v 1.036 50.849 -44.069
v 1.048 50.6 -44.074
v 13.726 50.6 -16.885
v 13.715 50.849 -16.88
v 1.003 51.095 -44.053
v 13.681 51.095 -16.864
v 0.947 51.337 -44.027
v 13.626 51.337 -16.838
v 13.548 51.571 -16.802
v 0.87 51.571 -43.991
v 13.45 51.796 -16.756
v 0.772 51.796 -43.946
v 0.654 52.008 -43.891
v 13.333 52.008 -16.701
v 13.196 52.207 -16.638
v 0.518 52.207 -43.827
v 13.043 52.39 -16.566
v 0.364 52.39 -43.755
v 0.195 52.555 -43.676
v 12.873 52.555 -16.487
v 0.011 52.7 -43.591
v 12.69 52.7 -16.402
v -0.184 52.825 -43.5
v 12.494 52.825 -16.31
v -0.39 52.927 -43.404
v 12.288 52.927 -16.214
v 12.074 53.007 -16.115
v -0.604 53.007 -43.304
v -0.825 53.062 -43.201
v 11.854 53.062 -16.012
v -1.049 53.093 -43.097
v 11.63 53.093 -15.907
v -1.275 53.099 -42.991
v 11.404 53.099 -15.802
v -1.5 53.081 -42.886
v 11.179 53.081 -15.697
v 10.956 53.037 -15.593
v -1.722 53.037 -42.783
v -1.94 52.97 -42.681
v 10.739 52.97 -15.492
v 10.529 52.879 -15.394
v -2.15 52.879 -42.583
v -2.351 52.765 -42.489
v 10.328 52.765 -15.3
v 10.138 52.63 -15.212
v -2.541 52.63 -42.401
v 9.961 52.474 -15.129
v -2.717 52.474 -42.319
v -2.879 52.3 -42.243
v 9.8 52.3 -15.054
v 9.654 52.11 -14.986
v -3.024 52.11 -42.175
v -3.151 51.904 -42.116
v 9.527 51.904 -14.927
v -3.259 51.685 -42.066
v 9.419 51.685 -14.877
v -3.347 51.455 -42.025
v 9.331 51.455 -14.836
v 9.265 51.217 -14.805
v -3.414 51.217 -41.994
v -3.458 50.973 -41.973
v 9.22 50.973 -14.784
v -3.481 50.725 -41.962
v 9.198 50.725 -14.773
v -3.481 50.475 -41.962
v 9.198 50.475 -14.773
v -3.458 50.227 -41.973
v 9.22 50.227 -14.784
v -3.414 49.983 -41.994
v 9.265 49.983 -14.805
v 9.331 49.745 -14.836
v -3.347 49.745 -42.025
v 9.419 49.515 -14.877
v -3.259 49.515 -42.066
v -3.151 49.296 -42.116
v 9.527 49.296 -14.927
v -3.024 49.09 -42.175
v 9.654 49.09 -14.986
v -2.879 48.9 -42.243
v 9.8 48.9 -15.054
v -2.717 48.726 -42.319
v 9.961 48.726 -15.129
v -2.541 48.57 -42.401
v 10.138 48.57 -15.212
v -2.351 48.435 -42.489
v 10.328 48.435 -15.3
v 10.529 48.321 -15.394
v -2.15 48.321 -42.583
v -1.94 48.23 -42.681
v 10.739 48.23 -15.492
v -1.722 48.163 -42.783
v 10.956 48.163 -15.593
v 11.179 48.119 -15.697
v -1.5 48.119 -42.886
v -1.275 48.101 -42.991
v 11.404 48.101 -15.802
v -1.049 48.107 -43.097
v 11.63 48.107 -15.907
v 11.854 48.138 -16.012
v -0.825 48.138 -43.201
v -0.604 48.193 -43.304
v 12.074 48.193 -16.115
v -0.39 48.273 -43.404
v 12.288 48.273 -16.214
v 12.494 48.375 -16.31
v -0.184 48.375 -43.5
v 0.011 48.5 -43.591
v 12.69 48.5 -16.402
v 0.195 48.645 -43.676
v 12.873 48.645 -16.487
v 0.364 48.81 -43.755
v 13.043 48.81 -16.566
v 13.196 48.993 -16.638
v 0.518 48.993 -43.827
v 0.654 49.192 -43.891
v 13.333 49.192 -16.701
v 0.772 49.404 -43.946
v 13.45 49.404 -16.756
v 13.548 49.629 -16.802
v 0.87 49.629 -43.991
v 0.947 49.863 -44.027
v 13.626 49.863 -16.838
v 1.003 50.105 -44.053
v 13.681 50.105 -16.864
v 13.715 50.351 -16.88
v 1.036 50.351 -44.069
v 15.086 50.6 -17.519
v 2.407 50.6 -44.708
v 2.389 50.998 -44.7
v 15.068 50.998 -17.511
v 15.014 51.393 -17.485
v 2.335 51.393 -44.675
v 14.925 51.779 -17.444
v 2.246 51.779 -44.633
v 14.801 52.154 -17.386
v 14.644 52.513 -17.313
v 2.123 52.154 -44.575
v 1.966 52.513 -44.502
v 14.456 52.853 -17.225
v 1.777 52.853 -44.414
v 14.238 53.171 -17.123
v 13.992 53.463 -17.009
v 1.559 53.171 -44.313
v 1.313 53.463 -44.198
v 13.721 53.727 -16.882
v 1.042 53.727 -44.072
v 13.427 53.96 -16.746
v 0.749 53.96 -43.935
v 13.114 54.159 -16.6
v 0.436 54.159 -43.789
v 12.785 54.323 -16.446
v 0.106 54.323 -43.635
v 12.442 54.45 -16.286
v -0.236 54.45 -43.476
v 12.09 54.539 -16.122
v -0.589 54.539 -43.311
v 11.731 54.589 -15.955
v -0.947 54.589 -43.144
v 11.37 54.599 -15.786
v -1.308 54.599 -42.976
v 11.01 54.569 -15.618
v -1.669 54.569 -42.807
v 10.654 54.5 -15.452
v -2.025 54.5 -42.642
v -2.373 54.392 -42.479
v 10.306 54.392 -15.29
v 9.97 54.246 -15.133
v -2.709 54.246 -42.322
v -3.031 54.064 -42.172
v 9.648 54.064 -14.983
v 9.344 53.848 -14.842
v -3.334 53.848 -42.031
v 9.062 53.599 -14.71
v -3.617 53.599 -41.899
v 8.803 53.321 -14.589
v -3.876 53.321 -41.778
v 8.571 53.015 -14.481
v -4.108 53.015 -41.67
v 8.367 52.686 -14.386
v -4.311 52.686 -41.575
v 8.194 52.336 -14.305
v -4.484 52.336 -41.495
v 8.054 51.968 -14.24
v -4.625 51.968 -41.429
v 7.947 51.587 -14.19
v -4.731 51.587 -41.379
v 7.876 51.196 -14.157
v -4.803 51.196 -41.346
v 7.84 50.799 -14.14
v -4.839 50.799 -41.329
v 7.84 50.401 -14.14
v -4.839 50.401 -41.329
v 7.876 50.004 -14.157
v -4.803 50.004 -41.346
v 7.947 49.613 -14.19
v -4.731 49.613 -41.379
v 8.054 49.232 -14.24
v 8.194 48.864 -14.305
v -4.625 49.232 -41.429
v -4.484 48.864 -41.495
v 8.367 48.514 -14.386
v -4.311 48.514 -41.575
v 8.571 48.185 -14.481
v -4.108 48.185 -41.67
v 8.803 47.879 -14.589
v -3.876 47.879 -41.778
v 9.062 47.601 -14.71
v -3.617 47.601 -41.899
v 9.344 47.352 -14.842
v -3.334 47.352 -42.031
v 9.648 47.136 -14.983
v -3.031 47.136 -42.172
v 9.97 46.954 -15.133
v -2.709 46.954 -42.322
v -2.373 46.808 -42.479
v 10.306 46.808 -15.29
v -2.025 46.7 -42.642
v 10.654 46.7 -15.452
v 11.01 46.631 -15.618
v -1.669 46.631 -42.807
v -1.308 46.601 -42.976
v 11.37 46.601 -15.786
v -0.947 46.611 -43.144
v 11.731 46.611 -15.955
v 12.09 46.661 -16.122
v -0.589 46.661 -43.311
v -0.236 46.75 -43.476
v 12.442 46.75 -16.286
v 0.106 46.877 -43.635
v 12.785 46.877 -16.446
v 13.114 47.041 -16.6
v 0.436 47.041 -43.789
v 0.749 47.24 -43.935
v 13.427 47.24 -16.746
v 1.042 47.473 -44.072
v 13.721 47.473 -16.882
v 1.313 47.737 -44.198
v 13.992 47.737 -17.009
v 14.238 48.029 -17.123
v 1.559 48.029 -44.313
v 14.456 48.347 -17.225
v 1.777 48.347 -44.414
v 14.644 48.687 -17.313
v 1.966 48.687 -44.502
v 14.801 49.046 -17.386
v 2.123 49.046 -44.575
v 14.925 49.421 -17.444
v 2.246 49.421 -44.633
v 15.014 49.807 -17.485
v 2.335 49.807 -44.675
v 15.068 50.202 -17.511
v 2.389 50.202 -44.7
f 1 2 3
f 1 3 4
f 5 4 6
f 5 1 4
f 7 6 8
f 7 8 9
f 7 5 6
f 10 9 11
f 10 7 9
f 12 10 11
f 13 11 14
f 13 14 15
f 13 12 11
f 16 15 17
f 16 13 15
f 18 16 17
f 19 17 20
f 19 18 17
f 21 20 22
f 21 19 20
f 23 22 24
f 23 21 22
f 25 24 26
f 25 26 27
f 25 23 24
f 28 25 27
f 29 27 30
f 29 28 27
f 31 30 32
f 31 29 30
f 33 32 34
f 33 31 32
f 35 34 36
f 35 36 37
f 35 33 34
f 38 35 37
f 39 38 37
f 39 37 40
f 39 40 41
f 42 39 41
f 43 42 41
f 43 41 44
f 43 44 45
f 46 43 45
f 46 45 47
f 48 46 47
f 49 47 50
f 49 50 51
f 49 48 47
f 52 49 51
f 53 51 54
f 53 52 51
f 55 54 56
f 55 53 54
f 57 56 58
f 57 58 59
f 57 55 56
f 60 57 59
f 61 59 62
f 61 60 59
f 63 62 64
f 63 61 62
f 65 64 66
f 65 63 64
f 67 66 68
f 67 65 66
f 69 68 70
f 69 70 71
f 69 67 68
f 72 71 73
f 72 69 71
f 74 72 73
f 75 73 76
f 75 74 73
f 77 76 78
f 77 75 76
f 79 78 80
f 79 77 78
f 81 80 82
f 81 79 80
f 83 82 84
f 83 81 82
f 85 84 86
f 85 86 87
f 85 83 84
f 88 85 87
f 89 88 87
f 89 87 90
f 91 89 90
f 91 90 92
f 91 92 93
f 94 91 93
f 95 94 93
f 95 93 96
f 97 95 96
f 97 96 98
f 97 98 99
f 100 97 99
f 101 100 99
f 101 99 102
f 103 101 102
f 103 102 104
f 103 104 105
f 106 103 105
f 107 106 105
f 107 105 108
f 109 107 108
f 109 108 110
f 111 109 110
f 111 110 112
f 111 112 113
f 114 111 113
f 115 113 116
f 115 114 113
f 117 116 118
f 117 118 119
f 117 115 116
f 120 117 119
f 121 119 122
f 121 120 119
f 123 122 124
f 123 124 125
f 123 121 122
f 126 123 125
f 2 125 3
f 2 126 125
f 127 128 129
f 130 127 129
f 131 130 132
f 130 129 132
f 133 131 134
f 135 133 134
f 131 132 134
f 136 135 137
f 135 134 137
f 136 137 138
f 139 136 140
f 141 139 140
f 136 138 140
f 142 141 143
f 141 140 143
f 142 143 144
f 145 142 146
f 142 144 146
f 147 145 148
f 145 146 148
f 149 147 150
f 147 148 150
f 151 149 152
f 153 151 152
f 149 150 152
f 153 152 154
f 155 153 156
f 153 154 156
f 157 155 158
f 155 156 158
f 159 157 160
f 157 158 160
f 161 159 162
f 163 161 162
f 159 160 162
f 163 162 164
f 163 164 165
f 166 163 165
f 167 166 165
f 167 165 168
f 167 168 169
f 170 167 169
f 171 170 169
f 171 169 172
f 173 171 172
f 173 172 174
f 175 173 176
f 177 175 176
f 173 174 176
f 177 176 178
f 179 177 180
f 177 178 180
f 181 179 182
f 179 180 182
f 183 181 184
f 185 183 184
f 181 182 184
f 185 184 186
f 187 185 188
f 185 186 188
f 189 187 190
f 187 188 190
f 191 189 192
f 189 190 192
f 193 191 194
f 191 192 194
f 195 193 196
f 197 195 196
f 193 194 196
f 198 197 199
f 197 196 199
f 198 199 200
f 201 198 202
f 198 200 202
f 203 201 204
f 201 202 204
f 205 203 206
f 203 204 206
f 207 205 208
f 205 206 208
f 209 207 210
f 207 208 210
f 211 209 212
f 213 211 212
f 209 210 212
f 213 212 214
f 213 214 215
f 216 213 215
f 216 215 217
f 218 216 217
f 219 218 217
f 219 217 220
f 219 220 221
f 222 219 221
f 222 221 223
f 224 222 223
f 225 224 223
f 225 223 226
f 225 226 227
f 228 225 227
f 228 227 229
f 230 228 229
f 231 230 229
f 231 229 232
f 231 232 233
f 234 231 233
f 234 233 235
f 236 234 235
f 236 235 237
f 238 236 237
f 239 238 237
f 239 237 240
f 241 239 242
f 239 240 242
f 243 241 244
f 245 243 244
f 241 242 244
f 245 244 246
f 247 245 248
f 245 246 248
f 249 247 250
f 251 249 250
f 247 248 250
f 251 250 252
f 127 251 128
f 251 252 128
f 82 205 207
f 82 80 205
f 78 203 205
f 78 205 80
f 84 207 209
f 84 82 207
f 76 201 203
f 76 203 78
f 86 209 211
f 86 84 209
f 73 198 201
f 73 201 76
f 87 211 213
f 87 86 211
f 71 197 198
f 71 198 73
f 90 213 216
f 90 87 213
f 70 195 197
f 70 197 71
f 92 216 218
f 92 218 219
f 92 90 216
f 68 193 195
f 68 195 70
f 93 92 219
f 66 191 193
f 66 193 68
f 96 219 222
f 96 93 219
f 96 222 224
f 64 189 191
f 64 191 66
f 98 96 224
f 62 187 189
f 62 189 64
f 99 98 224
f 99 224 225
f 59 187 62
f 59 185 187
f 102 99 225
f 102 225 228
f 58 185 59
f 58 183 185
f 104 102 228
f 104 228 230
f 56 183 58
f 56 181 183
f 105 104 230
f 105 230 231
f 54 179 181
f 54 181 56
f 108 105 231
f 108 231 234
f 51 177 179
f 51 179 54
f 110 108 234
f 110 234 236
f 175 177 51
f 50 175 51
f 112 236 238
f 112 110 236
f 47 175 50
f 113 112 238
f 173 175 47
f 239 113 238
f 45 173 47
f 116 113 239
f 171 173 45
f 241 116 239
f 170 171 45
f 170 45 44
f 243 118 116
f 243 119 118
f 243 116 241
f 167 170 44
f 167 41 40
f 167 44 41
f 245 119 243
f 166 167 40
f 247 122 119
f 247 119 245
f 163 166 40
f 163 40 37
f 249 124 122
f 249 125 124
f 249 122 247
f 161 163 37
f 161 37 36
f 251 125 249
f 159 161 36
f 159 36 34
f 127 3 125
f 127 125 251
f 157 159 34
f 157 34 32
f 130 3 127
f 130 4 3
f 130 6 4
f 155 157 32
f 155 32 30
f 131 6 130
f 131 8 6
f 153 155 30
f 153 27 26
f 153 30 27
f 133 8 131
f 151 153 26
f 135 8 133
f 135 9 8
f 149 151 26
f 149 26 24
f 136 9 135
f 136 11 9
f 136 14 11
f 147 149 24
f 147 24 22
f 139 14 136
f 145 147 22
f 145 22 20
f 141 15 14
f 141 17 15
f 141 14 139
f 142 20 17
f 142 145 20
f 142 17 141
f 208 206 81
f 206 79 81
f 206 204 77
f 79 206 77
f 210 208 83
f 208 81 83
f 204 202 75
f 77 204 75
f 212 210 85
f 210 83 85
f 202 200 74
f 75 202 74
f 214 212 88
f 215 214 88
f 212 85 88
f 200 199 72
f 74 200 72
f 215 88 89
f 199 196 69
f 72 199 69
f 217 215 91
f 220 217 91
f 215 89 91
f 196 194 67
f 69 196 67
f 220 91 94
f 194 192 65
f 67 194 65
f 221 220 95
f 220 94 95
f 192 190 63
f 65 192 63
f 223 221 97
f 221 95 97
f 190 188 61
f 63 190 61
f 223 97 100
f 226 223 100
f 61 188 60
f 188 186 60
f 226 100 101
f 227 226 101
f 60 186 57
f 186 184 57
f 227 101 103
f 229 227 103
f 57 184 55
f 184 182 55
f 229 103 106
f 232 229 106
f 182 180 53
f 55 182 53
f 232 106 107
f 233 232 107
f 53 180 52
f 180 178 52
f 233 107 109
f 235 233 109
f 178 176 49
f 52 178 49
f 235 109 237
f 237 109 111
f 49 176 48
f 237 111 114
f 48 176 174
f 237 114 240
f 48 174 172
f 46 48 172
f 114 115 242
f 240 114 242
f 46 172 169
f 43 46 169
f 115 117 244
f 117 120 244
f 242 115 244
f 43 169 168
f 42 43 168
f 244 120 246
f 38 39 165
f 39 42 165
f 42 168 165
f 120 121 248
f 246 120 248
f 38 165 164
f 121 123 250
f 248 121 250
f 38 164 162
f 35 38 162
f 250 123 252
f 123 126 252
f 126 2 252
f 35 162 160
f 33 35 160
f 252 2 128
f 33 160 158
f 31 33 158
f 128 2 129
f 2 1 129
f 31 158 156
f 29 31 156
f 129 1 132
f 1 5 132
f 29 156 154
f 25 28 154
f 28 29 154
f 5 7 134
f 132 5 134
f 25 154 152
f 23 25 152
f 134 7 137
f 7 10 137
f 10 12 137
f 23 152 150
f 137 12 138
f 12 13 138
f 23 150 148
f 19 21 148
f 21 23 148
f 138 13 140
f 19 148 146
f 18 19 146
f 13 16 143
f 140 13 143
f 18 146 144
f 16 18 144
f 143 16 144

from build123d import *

# Parameters (mm, degrees)
CYLINDER054_R          = 2.5
CYLINDER054_DEPTH      = 30
CYLINDER053_R          = 4
CYLINDER053_DEPTH      = 30
CUT056_PLACEMENT_ANGLE = 25


with BuildPart() as cylinder054:
    # Cylinder054 → Cylinder054 (new body)
    with BuildSketch(Plane.XY):
        Circle(CYLINDER054_R)
    extrude(amount=CYLINDER054_DEPTH)


with BuildPart() as flextube:
    # Cylinder053 → Cylinder053 (new body)
    with BuildSketch(Plane.XY):
        Circle(CYLINDER053_R)
    extrude(amount=CYLINDER053_DEPTH)

    # Cut056: cut Cylinder054
    add(cylinder054.part, mode=Mode.SUBTRACT)


with BuildPart() as flextube_1:
    # Cut056 placement: moved
    add(flextube.part.moved(Location((-1.218022, 50.6, -43.017699))).rotate(Axis((-1.218022, 50.6, -43.017699), (0, 1, 0)), CUT056_PLACEMENT_ANGLE))


solid = flextube_1.part
